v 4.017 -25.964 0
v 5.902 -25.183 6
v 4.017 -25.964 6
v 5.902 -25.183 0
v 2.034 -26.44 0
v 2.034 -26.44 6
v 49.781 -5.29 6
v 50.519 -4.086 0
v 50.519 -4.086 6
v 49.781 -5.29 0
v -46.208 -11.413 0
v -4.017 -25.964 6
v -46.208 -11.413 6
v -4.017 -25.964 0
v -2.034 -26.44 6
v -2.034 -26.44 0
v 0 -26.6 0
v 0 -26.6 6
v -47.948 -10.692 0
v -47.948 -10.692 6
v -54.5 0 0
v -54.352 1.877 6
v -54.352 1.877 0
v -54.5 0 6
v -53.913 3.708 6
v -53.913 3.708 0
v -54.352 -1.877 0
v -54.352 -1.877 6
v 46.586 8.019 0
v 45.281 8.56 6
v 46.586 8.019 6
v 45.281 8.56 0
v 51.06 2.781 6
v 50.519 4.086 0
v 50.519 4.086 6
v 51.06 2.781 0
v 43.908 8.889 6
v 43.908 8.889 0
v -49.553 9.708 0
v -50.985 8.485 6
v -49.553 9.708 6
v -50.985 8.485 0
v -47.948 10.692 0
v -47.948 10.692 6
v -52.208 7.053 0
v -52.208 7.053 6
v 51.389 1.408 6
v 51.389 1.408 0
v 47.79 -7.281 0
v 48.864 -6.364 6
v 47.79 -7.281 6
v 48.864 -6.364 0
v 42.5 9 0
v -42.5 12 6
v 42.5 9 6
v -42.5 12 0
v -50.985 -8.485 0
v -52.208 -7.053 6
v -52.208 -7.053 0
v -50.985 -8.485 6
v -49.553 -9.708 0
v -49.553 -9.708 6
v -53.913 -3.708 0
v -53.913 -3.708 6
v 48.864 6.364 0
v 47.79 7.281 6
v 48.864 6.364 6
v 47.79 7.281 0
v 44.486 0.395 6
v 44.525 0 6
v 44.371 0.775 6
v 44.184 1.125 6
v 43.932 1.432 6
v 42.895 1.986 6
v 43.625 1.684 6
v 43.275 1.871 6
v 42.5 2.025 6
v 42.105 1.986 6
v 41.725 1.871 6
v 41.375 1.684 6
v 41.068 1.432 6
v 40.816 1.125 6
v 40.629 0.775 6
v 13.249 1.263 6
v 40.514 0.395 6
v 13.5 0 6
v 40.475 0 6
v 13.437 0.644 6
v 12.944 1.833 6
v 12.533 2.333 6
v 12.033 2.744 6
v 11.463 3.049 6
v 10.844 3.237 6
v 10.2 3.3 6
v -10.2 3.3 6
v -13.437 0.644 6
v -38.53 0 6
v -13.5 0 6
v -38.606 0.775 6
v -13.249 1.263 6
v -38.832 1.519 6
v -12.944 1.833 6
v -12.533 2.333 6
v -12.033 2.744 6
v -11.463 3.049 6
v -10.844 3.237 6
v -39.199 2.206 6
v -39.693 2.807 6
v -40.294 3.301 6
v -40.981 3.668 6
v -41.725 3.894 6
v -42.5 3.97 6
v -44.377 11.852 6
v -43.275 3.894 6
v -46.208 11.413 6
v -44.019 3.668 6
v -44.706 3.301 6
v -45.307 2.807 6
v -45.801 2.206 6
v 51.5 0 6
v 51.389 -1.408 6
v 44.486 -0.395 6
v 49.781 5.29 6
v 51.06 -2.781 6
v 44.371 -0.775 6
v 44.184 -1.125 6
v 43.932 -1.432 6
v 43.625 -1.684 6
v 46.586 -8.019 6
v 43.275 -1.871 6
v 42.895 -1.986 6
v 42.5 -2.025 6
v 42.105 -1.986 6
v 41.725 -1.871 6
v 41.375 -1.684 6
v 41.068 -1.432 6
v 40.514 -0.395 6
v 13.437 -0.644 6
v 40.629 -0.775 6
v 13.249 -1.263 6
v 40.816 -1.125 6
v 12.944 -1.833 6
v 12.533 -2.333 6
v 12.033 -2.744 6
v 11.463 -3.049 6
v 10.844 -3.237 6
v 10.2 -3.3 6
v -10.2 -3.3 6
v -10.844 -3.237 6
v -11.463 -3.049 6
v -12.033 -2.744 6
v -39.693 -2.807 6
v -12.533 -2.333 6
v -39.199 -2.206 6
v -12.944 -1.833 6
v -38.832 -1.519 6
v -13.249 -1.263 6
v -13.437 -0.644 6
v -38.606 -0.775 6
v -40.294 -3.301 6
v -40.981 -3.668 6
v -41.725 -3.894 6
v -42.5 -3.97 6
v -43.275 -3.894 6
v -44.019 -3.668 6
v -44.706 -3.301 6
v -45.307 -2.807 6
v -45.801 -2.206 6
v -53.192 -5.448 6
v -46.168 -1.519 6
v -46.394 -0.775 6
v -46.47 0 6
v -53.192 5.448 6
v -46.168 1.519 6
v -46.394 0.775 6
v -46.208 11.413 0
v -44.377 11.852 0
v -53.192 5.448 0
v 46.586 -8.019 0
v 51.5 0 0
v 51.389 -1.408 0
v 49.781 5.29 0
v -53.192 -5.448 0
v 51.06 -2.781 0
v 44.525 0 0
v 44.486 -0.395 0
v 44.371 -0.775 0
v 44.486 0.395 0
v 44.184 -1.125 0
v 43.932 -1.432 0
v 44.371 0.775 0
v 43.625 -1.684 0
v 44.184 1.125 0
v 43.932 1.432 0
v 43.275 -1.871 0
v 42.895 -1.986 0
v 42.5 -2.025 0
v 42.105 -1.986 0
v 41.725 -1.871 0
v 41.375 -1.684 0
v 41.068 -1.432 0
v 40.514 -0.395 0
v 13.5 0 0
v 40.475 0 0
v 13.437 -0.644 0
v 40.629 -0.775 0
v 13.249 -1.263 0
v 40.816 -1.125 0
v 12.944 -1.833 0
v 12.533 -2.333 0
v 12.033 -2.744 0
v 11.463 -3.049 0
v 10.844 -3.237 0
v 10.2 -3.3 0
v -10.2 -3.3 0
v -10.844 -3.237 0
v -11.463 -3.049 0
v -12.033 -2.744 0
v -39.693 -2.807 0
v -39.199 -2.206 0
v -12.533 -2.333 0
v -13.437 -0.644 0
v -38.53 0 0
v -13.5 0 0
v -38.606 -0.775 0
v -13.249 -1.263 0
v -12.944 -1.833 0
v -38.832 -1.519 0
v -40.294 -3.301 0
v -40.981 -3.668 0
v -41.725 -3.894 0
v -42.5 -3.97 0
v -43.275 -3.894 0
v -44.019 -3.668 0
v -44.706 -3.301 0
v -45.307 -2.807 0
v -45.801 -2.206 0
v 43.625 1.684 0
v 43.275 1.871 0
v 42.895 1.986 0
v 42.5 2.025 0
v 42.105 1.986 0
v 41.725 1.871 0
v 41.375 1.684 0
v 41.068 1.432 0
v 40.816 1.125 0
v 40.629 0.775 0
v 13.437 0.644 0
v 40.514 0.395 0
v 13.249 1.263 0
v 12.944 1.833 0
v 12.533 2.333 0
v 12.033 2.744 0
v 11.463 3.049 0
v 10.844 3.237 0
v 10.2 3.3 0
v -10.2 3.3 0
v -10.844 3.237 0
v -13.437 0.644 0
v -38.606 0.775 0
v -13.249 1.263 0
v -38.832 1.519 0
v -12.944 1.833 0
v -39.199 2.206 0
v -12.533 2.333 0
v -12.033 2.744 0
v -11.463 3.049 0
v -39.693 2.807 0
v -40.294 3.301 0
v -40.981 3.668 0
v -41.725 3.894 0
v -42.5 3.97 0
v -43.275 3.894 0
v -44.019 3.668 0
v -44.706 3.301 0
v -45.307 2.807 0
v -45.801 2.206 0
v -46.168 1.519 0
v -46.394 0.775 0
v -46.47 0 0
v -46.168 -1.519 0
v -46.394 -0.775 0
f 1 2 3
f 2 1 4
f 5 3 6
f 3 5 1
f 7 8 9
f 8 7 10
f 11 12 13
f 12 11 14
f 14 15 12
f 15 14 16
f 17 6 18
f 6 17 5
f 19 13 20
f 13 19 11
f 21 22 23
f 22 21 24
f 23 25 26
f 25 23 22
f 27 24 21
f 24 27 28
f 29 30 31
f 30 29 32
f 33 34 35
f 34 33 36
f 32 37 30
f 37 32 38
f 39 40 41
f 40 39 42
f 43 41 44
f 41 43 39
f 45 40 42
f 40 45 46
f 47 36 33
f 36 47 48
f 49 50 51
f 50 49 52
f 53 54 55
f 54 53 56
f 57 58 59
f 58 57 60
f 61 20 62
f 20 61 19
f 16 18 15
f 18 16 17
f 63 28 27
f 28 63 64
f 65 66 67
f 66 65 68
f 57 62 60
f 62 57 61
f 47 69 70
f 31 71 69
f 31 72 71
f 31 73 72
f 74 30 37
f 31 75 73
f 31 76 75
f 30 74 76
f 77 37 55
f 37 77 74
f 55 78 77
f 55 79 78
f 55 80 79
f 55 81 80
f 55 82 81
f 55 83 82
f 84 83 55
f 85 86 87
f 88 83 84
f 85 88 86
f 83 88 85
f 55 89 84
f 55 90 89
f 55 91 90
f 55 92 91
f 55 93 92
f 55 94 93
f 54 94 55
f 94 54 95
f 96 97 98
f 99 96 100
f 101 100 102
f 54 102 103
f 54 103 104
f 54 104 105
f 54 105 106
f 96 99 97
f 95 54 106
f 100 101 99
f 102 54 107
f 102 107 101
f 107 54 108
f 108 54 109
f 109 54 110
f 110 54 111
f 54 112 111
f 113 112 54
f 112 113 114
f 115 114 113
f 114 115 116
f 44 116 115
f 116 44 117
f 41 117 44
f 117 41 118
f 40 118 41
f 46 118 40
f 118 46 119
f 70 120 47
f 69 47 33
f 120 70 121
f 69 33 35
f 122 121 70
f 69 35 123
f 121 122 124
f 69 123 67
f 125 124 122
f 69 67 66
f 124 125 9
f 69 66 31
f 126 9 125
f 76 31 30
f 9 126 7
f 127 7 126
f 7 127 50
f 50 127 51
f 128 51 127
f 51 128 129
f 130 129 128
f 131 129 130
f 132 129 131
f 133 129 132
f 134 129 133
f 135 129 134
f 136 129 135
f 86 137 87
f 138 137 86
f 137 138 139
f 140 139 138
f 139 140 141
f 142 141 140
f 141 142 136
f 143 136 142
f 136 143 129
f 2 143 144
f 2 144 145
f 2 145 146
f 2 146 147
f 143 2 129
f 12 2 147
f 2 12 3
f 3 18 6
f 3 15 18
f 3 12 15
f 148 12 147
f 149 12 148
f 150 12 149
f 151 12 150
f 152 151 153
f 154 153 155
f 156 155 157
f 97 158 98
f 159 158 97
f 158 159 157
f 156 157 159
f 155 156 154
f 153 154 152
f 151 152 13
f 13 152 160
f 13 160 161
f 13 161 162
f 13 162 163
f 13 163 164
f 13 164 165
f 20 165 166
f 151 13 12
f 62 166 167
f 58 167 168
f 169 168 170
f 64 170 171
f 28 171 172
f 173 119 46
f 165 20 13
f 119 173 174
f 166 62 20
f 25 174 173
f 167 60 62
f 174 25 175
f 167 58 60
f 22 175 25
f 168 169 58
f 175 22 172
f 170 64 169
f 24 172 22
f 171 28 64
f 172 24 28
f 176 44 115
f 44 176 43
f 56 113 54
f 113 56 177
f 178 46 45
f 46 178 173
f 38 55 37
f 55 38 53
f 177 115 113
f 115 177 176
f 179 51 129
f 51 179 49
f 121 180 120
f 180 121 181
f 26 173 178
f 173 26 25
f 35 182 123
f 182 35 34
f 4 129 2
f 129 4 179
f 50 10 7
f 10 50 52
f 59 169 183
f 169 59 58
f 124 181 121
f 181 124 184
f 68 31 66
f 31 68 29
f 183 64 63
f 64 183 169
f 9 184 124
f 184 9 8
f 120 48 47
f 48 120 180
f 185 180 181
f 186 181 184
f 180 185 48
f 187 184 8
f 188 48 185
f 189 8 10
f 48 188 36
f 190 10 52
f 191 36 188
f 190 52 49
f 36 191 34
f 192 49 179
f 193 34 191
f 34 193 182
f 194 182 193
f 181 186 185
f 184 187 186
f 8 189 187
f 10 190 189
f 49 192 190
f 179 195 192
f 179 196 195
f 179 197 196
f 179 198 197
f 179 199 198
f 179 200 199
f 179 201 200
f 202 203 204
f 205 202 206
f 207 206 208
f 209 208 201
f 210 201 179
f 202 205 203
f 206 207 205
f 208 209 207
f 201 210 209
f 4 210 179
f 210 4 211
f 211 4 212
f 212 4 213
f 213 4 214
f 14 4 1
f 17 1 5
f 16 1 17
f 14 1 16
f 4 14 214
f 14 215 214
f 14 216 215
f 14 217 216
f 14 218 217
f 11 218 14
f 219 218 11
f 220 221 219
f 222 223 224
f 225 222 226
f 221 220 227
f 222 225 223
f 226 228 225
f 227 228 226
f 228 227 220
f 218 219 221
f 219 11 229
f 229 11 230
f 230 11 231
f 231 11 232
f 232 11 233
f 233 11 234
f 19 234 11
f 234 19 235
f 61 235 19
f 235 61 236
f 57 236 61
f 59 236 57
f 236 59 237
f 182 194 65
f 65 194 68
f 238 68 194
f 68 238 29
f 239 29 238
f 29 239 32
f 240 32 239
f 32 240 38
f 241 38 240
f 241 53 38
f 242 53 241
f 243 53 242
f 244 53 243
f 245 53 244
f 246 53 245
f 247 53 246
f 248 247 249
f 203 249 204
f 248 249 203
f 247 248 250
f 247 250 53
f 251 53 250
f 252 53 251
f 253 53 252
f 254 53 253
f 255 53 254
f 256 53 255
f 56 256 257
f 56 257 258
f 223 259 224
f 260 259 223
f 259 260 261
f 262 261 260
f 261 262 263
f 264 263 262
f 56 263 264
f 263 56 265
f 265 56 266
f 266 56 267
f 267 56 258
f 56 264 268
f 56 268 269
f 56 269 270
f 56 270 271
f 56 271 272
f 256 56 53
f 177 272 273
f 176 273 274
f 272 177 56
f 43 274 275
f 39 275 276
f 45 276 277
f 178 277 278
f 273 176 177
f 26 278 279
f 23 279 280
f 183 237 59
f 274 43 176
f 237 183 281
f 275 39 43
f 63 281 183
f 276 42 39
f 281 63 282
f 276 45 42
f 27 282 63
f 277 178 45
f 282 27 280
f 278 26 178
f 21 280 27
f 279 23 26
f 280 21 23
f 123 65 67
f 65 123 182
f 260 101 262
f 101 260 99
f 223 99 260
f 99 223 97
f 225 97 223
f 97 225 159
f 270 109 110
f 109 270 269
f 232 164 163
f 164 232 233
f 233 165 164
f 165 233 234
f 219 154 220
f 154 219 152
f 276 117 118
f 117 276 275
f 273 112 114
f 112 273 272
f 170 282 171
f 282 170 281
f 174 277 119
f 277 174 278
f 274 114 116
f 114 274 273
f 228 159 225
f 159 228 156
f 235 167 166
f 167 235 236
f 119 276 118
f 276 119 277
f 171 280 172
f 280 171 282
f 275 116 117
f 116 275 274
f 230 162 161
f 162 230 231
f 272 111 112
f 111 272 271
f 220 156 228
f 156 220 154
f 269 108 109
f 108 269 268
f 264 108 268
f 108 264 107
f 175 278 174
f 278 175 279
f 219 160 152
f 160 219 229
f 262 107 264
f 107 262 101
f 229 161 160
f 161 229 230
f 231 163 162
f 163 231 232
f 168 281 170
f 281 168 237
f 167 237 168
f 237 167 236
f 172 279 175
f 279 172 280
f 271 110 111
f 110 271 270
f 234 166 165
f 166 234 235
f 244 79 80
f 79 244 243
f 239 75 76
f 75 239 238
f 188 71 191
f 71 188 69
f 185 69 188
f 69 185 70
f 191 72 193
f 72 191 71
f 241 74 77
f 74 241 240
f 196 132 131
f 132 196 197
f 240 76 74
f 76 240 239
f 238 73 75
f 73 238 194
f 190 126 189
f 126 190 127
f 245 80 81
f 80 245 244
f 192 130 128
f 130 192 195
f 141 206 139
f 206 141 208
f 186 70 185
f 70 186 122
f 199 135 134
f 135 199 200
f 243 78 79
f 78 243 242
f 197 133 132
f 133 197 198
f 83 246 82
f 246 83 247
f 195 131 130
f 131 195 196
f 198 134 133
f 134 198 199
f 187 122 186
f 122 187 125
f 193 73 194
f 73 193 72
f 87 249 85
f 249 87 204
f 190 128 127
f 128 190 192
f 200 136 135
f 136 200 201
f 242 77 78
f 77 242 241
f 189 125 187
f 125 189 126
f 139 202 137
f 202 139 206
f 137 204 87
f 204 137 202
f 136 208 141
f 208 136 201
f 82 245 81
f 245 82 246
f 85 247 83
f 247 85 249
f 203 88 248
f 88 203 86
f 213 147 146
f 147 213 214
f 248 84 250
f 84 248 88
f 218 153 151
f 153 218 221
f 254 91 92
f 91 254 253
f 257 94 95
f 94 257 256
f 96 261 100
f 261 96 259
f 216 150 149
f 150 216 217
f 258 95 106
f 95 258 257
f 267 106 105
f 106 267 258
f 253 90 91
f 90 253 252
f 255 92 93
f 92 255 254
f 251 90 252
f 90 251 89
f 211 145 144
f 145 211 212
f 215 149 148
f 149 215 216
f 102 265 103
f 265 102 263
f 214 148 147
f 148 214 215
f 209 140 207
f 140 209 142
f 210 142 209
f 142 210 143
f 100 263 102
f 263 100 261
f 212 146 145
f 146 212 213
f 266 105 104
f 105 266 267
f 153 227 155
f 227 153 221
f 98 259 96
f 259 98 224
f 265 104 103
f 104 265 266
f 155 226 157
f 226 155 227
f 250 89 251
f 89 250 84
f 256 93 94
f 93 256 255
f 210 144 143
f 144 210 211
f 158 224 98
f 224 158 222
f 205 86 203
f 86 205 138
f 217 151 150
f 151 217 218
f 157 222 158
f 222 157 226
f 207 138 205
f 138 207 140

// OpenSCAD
$fn = 32;

// ----------------------------------------------------------------------
// Lever: 85 mm between the bosses, 6 mm thick, smooth outline
// ----------------------------------------------------------------------

// --- parameters (mm) ---
lever_l = 85;             // distance between the boss centres
boss_a = 24;              // first boss diameter
boss_b = 18;              // second boss diameter
bore_a = 7.94;            // first bore
bore_b = 4.05;            // second bore
lever_t = 6;              // lever thickness
boss_c = 26;              // middle boss diameter
bend = 13.6;              // how far the middle boss drops
slot_w = 6.6;             // adjustment slot width

lever_profile = [[-54.5, 0], [-54.352, -1.877], [-53.913, -3.708], [-53.192, -5.448], [-52.208, -7.053], [-50.985, -8.485], [-49.553, -9.708], [-47.948, -10.692], [-46.208, -11.413], [-4.017, -25.964], [-2.034, -26.44], [0, -26.6], [2.034, -26.44], [4.017, -25.964], [5.902, -25.183], [46.586, -8.019], [47.79, -7.281], [48.864, -6.364], [49.781, -5.29], [50.519, -4.086], [51.06, -2.781], [51.389, -1.408], [51.5, 0], [51.389, 1.408], [51.06, 2.781], [50.519, 4.086], [49.781, 5.29], [48.864, 6.364], [47.79, 7.281], [46.586, 8.019], [45.281, 8.56], [43.908, 8.889], [42.5, 9], [-42.5, 12], [-44.377, 11.852], [-46.208, 11.413], [-47.948, 10.692], [-49.553, 9.708], [-50.985, 8.485], [-52.208, 7.053], [-53.192, 5.448], [-53.913, 3.708], [-54.352, 1.877]];

difference() {
  linear_extrude(height = lever_t) polygon(lever_profile);
  translate([-42.5, 0, -2.5]) cylinder(h = lever_t + 5, d = bore_a);
  translate([42.5, 0, -2.5]) cylinder(h = lever_t + 5, d = bore_b);
  /* slotted adjustment, stadium shaped */
  hull() {
    translate([-10.2, 0, -2.5]) cylinder(h = lever_t + 5, d = slot_w);
    translate([10.2, 0, -2.5]) cylinder(h = lever_t + 5, d = slot_w);
  }
}
